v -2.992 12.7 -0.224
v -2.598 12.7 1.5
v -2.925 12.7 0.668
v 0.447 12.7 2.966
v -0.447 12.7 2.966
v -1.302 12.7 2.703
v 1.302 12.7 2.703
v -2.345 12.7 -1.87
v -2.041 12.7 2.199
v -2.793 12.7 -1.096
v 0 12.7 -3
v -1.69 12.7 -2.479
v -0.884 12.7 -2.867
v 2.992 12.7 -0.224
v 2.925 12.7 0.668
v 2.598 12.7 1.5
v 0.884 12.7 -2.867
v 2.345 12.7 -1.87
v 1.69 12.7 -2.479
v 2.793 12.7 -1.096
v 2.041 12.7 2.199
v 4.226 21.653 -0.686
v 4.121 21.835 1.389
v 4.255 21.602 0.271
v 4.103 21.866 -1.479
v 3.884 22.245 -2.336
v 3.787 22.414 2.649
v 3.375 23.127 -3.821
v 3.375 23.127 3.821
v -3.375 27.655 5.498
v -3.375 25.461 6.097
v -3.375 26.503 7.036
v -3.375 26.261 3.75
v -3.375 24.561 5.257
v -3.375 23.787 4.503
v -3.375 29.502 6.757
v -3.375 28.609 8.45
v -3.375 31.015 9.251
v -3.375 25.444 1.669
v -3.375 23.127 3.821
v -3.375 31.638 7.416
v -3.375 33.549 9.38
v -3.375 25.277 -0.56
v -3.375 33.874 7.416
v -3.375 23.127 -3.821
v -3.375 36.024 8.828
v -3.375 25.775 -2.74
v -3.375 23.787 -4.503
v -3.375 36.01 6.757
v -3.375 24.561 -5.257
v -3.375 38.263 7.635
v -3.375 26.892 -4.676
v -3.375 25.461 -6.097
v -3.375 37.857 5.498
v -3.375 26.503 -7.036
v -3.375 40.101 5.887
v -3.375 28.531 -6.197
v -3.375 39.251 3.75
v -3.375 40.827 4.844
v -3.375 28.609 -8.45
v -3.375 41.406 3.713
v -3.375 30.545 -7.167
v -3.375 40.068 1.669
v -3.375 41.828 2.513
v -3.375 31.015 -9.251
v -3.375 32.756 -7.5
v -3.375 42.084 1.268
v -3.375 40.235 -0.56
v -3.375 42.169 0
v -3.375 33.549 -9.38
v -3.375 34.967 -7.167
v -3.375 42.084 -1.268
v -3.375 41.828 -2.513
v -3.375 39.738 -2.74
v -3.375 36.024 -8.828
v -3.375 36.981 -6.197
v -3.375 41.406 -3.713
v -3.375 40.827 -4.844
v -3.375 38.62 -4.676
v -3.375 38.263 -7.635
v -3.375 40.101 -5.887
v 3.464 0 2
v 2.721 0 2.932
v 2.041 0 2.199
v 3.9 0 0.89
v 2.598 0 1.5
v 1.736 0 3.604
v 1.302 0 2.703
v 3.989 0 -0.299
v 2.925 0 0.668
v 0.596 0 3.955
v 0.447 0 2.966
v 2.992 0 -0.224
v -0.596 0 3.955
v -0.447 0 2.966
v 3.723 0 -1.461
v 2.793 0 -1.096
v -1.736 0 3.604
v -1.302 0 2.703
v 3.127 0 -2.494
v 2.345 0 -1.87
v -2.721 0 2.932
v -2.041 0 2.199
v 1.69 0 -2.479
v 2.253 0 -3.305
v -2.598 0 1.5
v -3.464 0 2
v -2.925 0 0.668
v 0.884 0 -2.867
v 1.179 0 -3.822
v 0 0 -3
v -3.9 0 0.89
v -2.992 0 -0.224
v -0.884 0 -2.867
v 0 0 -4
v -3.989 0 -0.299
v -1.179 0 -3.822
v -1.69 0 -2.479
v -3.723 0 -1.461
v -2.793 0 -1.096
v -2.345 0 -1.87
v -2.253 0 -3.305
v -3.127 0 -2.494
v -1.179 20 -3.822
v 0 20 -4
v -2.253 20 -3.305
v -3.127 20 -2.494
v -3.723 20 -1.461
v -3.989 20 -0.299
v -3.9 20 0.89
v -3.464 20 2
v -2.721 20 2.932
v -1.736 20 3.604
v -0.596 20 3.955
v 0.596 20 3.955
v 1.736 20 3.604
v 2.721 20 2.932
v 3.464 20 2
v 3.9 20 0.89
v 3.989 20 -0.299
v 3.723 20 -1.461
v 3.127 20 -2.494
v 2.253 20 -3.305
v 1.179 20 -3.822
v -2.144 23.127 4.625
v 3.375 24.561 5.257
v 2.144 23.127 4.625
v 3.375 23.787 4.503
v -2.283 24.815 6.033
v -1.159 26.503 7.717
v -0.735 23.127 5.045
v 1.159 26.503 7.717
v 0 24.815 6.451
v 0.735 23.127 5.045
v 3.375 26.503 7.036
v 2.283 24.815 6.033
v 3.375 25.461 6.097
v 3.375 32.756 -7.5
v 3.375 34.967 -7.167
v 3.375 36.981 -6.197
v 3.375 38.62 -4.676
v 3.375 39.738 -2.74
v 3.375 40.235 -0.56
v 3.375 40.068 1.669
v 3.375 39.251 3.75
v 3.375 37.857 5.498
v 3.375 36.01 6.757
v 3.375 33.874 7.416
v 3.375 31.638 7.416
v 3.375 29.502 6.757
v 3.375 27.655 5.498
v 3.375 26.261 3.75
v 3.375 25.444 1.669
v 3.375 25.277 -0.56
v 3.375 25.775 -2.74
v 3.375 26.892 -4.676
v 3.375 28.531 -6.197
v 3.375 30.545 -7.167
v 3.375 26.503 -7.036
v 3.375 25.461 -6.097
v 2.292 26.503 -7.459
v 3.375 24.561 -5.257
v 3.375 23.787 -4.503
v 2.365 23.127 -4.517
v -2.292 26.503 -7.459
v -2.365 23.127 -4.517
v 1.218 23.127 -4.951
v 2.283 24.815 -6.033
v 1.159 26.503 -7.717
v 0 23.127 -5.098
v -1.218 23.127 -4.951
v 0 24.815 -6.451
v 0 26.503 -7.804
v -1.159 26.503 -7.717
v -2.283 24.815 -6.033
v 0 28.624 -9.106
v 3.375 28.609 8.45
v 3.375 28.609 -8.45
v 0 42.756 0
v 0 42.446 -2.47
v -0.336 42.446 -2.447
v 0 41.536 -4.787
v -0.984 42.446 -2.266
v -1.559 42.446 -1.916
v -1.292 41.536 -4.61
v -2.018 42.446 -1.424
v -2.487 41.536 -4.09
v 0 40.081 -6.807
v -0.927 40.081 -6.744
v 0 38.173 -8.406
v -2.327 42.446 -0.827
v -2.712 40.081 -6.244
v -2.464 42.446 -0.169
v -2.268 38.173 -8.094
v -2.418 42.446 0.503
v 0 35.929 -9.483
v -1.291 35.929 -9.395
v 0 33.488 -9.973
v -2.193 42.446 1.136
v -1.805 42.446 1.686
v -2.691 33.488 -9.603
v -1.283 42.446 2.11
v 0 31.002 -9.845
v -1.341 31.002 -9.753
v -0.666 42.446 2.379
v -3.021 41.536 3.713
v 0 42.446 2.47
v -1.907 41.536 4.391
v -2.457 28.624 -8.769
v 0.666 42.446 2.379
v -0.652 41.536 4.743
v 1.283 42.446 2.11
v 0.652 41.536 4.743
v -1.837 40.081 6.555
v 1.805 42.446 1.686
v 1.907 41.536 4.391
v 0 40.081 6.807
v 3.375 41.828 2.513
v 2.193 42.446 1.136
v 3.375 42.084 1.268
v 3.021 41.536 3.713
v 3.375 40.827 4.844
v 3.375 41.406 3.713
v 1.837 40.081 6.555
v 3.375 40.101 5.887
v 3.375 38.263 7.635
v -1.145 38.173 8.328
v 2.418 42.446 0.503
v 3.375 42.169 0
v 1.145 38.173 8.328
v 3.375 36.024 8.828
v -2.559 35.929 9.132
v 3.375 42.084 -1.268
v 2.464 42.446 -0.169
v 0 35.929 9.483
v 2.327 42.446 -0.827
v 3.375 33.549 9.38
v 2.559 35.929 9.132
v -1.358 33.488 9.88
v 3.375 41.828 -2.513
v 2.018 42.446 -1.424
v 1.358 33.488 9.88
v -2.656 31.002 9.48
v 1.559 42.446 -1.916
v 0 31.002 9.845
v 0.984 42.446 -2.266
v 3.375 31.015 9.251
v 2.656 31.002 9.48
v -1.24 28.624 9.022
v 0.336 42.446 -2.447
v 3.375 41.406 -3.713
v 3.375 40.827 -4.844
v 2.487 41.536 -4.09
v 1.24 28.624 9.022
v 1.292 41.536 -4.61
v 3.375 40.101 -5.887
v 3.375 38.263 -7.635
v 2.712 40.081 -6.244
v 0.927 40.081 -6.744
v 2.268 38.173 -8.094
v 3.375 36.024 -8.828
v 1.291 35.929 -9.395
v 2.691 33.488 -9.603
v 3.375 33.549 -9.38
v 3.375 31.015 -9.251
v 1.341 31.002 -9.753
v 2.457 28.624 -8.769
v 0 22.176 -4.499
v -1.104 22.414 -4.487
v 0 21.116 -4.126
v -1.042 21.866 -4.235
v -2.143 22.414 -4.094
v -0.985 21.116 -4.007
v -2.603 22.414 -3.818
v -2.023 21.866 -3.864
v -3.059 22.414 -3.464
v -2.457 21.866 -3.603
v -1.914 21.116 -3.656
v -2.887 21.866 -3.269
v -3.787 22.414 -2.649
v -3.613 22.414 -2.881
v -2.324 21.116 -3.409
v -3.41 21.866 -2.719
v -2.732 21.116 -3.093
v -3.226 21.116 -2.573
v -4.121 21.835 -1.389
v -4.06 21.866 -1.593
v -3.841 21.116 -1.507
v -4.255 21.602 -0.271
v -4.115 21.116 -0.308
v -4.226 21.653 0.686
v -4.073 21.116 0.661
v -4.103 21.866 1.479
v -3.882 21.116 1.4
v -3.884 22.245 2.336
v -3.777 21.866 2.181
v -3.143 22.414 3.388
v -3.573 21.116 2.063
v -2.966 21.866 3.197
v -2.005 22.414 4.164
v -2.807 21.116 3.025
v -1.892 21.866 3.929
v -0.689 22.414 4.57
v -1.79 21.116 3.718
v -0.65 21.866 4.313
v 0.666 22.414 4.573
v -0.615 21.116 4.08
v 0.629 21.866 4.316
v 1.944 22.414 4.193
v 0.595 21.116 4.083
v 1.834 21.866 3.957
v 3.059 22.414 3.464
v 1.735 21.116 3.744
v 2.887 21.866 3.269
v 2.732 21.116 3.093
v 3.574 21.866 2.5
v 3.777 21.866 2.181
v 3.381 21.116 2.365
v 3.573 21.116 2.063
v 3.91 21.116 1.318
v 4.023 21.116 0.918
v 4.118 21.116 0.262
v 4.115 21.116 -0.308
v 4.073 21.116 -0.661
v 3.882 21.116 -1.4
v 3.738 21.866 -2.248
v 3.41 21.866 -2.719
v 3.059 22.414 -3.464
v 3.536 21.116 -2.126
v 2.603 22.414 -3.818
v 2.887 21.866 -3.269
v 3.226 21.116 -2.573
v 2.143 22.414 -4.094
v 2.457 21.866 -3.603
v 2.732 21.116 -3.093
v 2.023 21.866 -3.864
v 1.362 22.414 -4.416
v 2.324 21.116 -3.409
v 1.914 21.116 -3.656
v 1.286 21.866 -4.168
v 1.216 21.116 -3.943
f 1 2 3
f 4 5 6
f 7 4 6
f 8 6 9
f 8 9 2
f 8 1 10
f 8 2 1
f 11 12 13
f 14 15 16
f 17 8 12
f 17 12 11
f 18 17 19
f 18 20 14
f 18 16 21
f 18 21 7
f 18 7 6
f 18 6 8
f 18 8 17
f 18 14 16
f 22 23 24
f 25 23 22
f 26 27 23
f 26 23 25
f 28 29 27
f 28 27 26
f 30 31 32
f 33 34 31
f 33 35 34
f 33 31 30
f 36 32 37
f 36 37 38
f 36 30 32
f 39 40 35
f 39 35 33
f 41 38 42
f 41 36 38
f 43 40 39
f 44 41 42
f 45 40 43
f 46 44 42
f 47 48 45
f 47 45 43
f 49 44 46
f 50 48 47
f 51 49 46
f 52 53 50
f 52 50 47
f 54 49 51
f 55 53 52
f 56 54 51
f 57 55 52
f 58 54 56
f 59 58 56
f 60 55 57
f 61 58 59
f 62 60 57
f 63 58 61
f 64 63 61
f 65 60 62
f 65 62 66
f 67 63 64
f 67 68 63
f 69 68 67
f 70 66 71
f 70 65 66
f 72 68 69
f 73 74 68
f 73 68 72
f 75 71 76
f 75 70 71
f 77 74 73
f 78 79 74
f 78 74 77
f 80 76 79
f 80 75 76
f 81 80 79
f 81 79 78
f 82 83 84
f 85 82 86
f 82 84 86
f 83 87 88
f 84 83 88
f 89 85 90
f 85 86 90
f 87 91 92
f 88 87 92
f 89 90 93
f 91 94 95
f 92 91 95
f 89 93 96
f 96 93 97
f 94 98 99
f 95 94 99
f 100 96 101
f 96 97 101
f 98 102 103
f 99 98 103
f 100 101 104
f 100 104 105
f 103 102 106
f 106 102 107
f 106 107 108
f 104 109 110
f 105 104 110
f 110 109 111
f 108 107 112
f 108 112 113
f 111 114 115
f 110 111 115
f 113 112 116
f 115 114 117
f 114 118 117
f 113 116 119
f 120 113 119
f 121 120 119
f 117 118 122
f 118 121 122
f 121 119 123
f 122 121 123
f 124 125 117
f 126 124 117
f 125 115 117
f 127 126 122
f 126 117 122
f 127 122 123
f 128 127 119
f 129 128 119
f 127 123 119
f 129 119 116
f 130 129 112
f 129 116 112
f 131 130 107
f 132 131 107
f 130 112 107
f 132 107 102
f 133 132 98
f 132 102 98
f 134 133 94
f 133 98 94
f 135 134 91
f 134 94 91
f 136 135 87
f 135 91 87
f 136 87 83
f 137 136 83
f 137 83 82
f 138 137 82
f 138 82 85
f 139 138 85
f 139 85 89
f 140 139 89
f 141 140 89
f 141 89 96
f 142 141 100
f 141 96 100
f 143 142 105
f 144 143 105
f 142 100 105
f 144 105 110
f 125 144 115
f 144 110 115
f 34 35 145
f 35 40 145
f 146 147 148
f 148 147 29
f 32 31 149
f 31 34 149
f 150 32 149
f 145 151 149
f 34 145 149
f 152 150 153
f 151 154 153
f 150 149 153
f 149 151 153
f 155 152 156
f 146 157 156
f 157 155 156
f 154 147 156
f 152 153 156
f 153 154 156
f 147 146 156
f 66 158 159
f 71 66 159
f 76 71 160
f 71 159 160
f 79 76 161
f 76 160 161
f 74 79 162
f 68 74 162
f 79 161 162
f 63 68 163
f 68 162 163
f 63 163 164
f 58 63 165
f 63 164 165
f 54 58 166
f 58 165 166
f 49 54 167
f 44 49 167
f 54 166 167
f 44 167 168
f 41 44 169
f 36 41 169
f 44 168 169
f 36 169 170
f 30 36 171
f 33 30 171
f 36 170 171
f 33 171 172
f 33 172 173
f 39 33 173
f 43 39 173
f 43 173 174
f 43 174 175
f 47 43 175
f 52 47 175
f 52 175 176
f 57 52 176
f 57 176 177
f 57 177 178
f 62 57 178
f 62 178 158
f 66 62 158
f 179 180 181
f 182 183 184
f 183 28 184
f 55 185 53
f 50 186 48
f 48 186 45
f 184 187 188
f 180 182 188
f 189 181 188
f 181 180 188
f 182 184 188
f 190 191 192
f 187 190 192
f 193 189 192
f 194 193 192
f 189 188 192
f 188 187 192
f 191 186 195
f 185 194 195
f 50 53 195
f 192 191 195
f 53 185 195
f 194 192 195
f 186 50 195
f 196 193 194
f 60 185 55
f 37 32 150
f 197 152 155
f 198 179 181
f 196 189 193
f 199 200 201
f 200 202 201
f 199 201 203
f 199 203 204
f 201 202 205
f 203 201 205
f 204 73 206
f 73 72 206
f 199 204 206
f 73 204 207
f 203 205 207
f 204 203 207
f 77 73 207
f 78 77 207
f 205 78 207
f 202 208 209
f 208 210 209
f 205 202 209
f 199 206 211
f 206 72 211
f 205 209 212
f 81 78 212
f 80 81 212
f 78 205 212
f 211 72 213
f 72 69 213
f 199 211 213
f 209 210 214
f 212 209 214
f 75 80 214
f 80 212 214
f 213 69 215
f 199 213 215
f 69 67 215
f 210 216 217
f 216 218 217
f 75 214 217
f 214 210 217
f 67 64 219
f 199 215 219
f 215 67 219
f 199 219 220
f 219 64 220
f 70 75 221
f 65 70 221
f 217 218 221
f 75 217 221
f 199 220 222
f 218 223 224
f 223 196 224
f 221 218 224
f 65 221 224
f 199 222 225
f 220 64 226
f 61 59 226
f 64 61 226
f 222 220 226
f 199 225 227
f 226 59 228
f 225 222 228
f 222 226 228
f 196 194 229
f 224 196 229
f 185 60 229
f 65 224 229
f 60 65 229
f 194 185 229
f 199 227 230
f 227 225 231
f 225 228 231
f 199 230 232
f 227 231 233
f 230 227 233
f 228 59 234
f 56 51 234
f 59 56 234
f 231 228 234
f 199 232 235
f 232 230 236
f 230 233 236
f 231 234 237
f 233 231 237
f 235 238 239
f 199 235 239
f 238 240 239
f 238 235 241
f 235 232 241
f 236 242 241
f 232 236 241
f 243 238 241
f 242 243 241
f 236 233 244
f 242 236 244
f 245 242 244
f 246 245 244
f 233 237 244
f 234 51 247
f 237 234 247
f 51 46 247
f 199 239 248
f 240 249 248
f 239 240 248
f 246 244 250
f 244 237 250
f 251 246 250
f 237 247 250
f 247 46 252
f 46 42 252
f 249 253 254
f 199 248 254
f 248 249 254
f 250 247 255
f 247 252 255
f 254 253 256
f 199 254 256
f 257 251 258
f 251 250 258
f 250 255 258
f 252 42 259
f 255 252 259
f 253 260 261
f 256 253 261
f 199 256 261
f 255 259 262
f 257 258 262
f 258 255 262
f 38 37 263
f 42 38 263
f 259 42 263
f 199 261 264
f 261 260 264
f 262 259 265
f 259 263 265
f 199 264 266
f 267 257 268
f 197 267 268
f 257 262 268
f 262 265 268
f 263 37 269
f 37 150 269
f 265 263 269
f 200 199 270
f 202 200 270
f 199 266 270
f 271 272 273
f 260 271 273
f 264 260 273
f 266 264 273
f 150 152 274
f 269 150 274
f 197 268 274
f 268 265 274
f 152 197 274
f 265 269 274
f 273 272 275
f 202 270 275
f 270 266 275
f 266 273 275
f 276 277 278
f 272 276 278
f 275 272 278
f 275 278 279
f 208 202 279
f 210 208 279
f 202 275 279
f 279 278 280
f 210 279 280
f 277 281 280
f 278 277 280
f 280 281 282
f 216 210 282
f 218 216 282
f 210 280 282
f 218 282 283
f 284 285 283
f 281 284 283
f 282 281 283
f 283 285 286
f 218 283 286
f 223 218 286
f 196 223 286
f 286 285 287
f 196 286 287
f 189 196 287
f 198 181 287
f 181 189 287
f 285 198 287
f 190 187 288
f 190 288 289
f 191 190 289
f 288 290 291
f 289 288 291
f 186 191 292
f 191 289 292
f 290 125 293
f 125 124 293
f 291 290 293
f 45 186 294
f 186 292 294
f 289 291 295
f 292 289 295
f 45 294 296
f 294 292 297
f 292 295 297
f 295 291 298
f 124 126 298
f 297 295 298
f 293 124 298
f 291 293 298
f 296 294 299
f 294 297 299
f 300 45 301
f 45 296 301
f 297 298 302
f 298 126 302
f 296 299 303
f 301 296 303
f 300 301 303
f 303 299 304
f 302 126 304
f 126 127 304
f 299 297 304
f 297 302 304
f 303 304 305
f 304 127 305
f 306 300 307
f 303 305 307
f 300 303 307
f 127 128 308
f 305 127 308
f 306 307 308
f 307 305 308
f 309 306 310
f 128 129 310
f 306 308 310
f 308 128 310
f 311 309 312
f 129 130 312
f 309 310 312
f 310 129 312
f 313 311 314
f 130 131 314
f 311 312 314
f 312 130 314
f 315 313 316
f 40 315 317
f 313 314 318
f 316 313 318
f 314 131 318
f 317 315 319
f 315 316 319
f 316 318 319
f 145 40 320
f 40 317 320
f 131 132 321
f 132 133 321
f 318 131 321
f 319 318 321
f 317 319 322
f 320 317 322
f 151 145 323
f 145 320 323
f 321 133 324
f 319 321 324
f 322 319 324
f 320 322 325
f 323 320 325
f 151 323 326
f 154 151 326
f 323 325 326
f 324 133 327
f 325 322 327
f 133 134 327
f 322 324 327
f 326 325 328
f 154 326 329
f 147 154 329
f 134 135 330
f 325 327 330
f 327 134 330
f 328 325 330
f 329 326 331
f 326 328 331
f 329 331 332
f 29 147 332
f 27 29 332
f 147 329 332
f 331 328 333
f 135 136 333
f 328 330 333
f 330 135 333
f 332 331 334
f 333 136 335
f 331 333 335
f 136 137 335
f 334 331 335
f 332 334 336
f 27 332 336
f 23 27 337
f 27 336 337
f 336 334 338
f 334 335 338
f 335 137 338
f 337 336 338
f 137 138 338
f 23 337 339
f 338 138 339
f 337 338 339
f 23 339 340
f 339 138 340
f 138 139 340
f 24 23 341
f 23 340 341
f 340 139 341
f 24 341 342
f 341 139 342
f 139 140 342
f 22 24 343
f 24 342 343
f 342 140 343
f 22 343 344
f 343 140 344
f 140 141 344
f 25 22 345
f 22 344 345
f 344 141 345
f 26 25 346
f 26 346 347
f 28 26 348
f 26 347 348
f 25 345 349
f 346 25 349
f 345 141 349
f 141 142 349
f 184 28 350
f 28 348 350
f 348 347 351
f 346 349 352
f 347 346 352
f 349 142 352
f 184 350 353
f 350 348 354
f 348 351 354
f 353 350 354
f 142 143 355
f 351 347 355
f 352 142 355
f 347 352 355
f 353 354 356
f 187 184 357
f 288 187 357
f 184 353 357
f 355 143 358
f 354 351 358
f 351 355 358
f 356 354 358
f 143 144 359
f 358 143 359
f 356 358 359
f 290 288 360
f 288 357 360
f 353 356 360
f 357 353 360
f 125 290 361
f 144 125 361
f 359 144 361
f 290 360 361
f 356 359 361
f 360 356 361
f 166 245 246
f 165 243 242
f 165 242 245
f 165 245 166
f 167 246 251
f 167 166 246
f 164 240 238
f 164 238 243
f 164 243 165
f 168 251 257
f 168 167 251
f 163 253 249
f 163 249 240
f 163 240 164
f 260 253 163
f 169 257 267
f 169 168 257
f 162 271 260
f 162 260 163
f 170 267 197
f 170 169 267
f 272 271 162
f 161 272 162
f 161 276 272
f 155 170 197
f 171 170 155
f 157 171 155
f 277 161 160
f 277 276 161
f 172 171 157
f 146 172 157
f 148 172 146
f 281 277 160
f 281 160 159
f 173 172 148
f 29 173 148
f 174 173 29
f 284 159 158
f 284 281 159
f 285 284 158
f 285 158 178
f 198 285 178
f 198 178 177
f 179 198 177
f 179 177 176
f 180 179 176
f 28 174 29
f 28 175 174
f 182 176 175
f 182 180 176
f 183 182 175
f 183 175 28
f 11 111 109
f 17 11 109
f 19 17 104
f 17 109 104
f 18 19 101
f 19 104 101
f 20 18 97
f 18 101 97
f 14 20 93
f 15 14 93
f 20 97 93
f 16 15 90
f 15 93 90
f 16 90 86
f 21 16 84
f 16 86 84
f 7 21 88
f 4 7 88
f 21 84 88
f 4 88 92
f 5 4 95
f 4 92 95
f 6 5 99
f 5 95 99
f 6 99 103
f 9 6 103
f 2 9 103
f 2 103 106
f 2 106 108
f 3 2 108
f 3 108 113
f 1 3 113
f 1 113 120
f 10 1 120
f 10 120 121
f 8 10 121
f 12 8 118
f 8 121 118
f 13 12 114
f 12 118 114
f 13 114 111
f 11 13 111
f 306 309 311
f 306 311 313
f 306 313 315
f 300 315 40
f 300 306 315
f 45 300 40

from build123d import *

# Parameters (mm, degrees)
CUT_EXTRUDE4_DEPTH      = 46.034307992
CUT_EXTRUDE4_DEPTH_BACK = 46.034307992
SKETCH3_R               = 7.5
CUT_EXTRUDE5_DEPTH      = 24
SKETCH5_R               = 3
CUT_EXTRUDE6_DEPTH      = 12.7


with BuildPart() as part:
    # Sketch1 → Revolve2 (revolve)
    with BuildSketch(Plane.XY, mode=Mode.PRIVATE) as revolve2_sk:
        with BuildLine():
            Line((0, 0), (0, 42.756156239))
            ThreePointArc((0, 42.756156239), (-9.01476789, 37.08443071), (-7.803677944, 26.502948219))
            Line((-7.803677944, 26.502948219), (-5.098161028, 23.12660401))
            ThreePointArc((-5.098161028, 23.12660401), (-4.282522133, 21.656925638), (-4, 20))
            Line((-4, 20), (-4, 0))
            Line((-4, 0), (0, 0))
        make_face()
    revolve(revolve2_sk.sketch.rotate(Axis((0, 0, 0), (0, 1, 0)), 270), axis=Axis((0, 0, 0), (0, 1, 0)))

    # Sketch2 → Cut-Extrude4 (cut, two sides: drawn at the far end of the back side and taken through both)
    with BuildSketch(Plane.XY.offset(-CUT_EXTRUDE4_DEPTH_BACK)):
        Polygon((-3.375, 42.756156239), (-20, 42.756156239), (-20, -5.668740666), (-3.375, 23.12660401), align=None)
        Polygon((20, 42.756156239), (3.375, 42.756156239), (3.375, 23.12660401), (20, -5.668740666), align=None)
    extrude(amount=CUT_EXTRUDE4_DEPTH + CUT_EXTRUDE4_DEPTH_BACK, mode=Mode.SUBTRACT)

    # Sketch3 → Cut-Extrude5 (cut)
    with BuildSketch(Plane(origin=(3.375, 0, 0), x_dir=(0, 0, -1), z_dir=(1, 0, 0))):
        with Locations((0, 32.756156239)):
            Circle(SKETCH3_R)
    extrude(amount=-CUT_EXTRUDE5_DEPTH, mode=Mode.SUBTRACT)

    # Sketch5 → Cut-Extrude6 (cut)
    with BuildSketch(Plane.XZ):
        with Locations(Location((0, 0, 0), (0, 0, 270))):
            Circle(SKETCH5_R)
    extrude(amount=-CUT_EXTRUDE6_DEPTH, mode=Mode.SUBTRACT)


solid = part.part
